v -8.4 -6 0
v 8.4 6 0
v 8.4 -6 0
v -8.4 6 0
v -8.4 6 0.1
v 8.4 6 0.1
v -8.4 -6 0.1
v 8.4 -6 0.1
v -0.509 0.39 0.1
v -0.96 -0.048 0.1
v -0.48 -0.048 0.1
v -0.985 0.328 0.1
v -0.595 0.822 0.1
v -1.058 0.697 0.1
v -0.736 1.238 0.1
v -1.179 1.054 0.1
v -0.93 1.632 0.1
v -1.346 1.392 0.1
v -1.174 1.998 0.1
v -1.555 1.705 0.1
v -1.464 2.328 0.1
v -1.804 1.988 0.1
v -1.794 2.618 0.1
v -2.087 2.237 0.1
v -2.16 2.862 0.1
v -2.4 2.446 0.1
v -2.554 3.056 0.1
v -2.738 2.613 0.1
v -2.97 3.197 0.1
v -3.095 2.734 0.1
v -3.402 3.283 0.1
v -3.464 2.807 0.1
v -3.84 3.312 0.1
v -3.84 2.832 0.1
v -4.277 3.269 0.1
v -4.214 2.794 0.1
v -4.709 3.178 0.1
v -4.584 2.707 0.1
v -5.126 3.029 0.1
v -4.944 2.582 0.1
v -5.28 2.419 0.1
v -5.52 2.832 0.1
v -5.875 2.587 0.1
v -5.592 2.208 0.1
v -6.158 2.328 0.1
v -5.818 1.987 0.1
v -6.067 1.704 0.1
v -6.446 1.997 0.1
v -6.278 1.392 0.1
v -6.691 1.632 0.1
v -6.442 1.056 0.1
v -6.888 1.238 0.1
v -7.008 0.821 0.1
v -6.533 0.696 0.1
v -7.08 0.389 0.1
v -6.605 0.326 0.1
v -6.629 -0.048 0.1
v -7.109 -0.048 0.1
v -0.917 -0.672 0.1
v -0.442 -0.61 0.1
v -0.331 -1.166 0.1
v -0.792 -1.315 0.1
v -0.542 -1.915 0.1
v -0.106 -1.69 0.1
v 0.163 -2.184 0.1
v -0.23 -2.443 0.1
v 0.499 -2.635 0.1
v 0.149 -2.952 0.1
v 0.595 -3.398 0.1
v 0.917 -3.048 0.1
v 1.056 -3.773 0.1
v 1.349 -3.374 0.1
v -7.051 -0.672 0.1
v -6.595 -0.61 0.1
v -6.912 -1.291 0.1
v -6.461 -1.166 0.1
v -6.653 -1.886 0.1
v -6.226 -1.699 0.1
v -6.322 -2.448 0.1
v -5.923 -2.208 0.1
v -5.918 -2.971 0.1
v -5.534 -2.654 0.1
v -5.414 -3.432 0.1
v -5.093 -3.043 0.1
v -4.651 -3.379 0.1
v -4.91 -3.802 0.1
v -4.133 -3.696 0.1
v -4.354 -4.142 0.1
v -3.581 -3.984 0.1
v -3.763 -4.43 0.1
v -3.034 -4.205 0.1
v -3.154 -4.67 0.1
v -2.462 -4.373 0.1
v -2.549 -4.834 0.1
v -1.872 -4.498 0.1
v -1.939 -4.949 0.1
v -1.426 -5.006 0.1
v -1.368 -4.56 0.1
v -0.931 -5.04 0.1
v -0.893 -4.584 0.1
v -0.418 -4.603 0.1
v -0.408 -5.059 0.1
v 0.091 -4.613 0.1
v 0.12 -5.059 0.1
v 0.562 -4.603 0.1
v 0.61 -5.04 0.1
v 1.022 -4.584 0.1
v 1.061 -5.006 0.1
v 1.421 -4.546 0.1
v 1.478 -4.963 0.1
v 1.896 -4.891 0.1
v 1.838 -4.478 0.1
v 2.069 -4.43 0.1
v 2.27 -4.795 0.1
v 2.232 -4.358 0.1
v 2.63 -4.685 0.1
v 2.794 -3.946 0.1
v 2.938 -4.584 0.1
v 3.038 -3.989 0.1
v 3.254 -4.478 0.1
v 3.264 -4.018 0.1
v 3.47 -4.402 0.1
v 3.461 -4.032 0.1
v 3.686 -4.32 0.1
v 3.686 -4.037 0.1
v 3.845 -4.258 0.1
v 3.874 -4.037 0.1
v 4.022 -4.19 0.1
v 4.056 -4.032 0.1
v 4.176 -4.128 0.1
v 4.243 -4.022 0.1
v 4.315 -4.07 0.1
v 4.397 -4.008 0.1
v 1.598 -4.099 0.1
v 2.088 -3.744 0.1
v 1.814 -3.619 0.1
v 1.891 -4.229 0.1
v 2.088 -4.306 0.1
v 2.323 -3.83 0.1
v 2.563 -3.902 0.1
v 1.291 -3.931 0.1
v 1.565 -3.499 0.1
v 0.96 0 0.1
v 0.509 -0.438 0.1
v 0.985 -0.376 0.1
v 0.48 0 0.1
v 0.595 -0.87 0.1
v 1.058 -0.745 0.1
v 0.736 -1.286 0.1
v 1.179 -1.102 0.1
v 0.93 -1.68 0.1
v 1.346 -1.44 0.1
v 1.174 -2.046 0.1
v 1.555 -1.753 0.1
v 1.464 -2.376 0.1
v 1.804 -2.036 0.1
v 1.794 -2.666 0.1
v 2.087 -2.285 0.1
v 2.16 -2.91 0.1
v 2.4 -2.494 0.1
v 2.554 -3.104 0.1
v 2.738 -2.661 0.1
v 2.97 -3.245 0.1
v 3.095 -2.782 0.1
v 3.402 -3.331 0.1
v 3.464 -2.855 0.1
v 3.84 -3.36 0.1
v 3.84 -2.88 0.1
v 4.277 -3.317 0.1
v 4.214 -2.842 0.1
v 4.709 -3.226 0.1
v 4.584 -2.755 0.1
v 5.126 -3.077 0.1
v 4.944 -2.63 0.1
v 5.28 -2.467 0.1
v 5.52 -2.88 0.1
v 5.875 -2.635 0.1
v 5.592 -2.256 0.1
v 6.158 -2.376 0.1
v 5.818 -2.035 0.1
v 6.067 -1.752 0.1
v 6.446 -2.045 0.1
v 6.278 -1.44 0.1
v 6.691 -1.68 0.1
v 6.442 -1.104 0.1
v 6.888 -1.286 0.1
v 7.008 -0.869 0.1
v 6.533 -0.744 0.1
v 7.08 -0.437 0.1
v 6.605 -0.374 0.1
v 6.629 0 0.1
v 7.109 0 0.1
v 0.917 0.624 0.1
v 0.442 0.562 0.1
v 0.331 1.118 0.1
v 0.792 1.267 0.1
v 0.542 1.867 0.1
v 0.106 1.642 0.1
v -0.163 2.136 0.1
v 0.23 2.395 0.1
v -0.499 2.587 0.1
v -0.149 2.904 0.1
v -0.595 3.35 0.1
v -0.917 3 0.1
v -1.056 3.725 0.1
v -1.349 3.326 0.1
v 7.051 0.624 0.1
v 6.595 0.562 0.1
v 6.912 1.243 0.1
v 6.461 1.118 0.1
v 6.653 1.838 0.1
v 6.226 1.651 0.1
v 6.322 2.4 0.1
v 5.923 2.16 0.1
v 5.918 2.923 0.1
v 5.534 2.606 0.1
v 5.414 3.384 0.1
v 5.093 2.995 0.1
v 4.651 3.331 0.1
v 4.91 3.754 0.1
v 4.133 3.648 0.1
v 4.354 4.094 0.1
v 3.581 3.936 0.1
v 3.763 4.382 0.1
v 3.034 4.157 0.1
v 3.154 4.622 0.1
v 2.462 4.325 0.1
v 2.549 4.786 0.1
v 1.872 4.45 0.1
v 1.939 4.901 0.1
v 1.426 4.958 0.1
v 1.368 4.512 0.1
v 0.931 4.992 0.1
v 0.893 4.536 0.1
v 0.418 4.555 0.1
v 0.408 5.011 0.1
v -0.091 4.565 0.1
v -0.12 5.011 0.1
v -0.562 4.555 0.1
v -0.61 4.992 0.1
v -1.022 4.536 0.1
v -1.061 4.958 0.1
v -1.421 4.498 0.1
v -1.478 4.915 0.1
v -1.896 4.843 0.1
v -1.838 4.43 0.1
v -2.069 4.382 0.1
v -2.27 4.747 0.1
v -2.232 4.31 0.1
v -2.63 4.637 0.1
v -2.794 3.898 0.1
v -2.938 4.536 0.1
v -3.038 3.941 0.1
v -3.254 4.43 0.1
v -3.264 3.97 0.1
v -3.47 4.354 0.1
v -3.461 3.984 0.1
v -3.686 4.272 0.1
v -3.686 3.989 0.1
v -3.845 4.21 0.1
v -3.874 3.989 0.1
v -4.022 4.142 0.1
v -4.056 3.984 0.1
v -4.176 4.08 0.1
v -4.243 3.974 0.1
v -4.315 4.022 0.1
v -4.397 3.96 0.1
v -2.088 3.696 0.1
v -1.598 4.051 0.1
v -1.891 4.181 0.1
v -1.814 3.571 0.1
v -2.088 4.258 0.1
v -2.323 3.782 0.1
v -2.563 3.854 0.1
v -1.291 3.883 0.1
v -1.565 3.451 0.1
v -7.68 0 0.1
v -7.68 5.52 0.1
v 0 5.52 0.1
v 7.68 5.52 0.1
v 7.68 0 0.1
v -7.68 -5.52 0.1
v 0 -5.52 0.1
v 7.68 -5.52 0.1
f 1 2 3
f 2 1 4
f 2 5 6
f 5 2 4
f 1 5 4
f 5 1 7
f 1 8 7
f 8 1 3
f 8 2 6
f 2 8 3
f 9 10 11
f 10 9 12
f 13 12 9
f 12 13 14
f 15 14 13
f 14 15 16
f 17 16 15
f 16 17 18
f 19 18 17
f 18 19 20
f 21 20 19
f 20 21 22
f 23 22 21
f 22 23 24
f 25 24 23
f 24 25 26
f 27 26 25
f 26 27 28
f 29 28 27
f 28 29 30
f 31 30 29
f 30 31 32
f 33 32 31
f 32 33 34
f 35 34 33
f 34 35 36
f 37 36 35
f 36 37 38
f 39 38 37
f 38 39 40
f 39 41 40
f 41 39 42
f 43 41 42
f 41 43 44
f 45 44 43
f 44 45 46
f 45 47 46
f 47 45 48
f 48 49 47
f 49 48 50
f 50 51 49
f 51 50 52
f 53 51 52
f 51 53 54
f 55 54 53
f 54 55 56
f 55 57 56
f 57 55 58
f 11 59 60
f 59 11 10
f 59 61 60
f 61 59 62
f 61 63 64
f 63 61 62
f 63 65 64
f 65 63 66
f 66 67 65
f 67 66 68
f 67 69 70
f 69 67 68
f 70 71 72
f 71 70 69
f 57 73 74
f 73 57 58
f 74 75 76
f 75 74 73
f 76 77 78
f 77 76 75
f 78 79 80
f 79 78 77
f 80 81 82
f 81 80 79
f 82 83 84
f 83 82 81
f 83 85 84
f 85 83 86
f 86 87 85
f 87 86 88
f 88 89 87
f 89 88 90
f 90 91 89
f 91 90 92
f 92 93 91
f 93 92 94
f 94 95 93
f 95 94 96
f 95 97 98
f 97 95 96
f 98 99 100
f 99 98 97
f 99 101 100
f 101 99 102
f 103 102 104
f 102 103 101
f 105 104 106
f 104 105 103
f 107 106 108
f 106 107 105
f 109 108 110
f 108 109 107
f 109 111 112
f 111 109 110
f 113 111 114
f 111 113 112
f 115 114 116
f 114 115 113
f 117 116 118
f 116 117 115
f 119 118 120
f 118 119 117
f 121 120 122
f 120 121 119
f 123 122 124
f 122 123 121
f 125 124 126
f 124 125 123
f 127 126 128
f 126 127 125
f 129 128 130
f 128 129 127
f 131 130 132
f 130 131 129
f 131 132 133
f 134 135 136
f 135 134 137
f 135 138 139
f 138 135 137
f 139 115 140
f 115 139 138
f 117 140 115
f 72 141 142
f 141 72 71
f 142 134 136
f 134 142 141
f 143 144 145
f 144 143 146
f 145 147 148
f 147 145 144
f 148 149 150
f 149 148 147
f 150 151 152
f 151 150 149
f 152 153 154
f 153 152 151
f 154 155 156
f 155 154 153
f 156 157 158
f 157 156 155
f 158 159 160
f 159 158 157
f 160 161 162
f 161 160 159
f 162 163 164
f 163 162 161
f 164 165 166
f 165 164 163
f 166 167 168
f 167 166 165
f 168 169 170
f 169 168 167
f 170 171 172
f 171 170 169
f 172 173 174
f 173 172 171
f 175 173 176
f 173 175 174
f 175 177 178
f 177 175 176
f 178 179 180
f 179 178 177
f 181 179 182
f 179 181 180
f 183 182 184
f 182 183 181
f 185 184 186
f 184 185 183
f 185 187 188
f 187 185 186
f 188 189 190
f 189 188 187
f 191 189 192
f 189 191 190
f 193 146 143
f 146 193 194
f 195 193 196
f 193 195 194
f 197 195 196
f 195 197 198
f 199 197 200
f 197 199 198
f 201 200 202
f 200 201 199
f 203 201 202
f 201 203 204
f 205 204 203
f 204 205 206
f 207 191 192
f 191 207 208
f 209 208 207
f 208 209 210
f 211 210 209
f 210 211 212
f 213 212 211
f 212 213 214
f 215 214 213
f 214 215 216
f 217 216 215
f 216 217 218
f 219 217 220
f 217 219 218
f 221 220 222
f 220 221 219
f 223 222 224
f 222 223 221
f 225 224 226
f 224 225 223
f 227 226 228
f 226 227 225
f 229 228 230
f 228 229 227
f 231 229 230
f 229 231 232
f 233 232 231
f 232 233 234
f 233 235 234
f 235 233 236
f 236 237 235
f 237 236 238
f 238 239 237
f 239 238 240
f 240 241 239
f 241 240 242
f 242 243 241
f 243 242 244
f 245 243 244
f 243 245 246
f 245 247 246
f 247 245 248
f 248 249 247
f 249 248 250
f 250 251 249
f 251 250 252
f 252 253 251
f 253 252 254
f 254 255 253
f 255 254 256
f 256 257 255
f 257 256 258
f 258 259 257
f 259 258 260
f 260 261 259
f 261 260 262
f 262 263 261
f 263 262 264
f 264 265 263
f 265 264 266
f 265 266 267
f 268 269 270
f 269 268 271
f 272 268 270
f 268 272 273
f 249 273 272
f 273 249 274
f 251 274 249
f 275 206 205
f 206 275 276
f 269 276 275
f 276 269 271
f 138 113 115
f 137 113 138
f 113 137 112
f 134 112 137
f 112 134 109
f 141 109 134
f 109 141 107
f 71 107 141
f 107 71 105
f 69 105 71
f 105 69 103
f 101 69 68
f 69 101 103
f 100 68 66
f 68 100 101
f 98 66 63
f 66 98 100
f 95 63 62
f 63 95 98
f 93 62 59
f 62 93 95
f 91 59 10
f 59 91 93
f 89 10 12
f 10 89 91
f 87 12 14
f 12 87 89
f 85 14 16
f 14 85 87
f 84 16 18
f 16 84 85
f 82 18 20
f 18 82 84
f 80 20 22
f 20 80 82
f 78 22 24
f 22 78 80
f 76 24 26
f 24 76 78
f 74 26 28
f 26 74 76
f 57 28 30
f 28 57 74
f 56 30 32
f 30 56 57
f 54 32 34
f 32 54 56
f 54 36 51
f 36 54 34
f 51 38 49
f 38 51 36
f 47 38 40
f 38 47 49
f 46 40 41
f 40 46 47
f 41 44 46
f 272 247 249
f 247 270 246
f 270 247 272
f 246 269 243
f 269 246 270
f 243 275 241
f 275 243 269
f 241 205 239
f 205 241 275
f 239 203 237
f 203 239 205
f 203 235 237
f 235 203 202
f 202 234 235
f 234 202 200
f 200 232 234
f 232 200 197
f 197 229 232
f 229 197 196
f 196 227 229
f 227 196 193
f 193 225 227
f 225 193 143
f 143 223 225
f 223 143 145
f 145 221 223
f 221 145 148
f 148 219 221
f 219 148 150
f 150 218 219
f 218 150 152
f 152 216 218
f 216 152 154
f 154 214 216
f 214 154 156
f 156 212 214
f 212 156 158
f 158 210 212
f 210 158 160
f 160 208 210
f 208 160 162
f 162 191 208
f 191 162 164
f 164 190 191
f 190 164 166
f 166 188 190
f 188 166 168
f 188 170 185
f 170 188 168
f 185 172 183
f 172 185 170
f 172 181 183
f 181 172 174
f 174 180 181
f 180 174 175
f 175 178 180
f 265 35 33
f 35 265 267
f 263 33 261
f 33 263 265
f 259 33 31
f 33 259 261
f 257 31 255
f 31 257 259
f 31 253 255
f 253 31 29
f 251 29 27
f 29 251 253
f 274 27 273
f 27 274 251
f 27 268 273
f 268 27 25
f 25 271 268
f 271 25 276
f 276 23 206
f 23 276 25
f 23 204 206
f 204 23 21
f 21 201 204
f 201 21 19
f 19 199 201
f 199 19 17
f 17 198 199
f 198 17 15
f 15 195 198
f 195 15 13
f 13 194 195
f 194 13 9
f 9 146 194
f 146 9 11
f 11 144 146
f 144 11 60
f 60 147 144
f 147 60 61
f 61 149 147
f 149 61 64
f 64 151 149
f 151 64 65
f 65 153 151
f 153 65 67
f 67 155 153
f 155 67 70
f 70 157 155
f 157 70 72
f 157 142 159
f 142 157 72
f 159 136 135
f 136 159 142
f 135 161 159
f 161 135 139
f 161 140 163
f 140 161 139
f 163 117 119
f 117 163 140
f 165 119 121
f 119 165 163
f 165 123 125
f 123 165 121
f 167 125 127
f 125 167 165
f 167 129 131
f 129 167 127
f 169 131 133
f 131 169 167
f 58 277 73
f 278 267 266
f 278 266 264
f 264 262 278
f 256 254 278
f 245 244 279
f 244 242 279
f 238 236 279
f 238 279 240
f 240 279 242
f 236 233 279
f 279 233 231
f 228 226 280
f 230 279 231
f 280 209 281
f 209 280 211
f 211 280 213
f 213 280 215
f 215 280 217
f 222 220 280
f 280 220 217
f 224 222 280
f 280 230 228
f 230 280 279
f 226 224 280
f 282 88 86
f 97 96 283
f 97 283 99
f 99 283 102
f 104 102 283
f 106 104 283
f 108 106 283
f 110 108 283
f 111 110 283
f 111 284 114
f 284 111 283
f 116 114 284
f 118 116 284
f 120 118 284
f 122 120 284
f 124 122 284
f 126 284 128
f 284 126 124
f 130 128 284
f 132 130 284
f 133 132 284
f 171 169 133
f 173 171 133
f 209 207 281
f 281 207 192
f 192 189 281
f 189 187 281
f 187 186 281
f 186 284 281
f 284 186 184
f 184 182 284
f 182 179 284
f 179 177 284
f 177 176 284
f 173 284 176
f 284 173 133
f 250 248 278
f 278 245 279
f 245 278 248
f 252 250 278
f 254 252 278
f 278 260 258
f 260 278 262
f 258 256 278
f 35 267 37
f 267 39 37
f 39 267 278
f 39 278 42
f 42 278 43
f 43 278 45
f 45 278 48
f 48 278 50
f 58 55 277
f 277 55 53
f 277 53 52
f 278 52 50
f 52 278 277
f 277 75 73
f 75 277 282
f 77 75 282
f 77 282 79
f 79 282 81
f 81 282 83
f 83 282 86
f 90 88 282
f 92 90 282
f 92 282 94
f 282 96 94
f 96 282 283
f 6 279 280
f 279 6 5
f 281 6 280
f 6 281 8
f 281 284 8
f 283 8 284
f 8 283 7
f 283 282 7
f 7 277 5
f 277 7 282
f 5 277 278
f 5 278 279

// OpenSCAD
// file: ../p/48/1-4ring6.scad
use <../../lib.scad>
function ldraw_lib__48__1_4ring6() = [
// 0 Hi-Res Ring  6 x 0.25
// 0 Name: 48\1-4ring6.dat
// 0 Author: Steve Bliss [sbliss]
// 0 !LDRAW_ORG 48_Primitive UPDATE 2012-02
// 0 !LICENSE Licensed under CC BY 4.0 : see CAreadme.txt
// 
// 0 BFC CERTIFY CCW
  [0,"BFC","CERTIFY"],
  [0,"BFC","CCW"],
// 
// 0 !HISTORY 2002-01-06 [sbliss] Added BFC compliance.
// 0 !HISTORY 2003-03-12 [PTadmin] Official Update 2003-01
// 0 !HISTORY 2007-06-24 [PTadmin] Header formatted for Contributor Agreement
// 0 !HISTORY 2008-07-01 [PTadmin] Official Update 2008-01
// 0 !HISTORY 2012-02-27 [Philo] Changed to CCW
// 0 !HISTORY 2012-08-09 [PTadmin] Official Update 2012-02
// 
// 
// 4 16 7 0 0 6.9398 0 0.9135 5.9484 0 0.783 6 0 0
  [4,16,7,0,0,6.9398,0,0.9135,5.9484,0,0.783,6,0,0],
// 4 16 6.9398 0 0.9135 6.7613 0 1.8116 5.7954 0 1.5528 5.9484 0 0.783
  [4,16,6.9398,0,0.9135,6.7613,0,1.8116,5.7954,0,1.5528,5.9484,0,0.783],
// 4 16 6.7613 0 1.8116 6.4673 0 2.6789 5.5434 0 2.2962 5.7954 0 1.5528
  [4,16,6.7613,0,1.8116,6.4673,0,2.6789,5.5434,0,2.2962,5.7954,0,1.5528],
// 4 16 6.4673 0 2.6789 6.062 0 3.5 5.196 0 3 5.5434 0 2.2962
  [4,16,6.4673,0,2.6789,6.062,0,3.5,5.196,0,3,5.5434,0,2.2962],
// 4 16 6.062 0 3.5 5.5538 0 4.2616 4.7604 0 3.6528 5.196 0 3
  [4,16,6.062,0,3.5,5.5538,0,4.2616,4.7604,0,3.6528,5.196,0,3],
// 4 16 5.5538 0 4.2616 4.9497 0 4.9497 4.2426 0 4.2426 4.7604 0 3.6528
  [4,16,5.5538,0,4.2616,4.9497,0,4.9497,4.2426,0,4.2426,4.7604,0,3.6528],
// 4 16 4.9497 0 4.9497 4.2616 0 5.5538 3.6528 0 4.7604 4.2426 0 4.2426
  [4,16,4.9497,0,4.9497,4.2616,0,5.5538,3.6528,0,4.7604,4.2426,0,4.2426],
// 4 16 4.2616 0 5.5538 3.5 0 6.062 3 0 5.196 3.6528 0 4.7604
  [4,16,4.2616,0,5.5538,3.5,0,6.062,3,0,5.196,3.6528,0,4.7604],
// 4 16 3.5 0 6.062 2.6789 0 6.4673 2.2962 0 5.5434 3 0 5.196
  [4,16,3.5,0,6.062,2.6789,0,6.4673,2.2962,0,5.5434,3,0,5.196],
// 4 16 2.6789 0 6.4673 1.8116 0 6.7613 1.5528 0 5.7954 2.2962 0 5.5434
  [4,16,2.6789,0,6.4673,1.8116,0,6.7613,1.5528,0,5.7954,2.2962,0,5.5434],
// 4 16 1.8116 0 6.7613 0.9135 0 6.9398 0.783 0 5.9484 1.5528 0 5.7954
  [4,16,1.8116,0,6.7613,0.9135,0,6.9398,0.783,0,5.9484,1.5528,0,5.7954],
// 4 16 0.9135 0 6.9398 0 0 7 0 0 6 0.783 0 5.9484
  [4,16,0.9135,0,6.9398,0,0,7,0,0,6,0.783,0,5.9484],
];
module ldraw_lib__48__1_4ring6(step=0, col=false, unit=2/5, alt=false, line=0.2, solid=!$preview)
    makepoly(ldraw_lib__48__1_4ring6(), step=step, col=col, unit=unit, alt=alt, line=line, solid=solid);
ldraw_lib__48__1_4ring6(line=0.2);
// file: ../p/logo-octan-2.scad
use <../lib.scad>
function ldraw_lib__logo_octan_2() = [
// 0 Logo Octan - Single Drop
// 0 Name: logo-octan-2.dat
// 0 Author: Ulrich Röder [UR]
// 0 !LDRAW_ORG Primitive UPDATE 2022-01
// 0 !LICENSE Licensed under CC BY 4.0 : see CAreadme.txt
// 
// 0 BFC CERTIFY CCW
  [0,"BFC","CERTIFY"],
  [0,"BFC","CCW"],
// 
// 0 !HISTORY 2022-01-14 [PTadmin] Official Update 2022-01
// 
// 
// 3 16 12.35 0 -8.87 12.31 0 -9.13 12.65 0 -8.98
  [3,16,12.35,0,-8.87,12.31,0,-9.13,12.65,0,-8.98],
// 4 16 12.35 0 -8.87 11.94 0 -8.71 11.83 0 -9.23 12.31 0 -9.13
  [4,16,12.35,0,-8.87,11.94,0,-8.71,11.83,0,-9.23,12.31,0,-9.13],
// 4 16 11.83 0 -9.23 11.94 0 -8.71 11.33 0 -8.44 10.96 0 -9.37
  [4,16,11.83,0,-9.23,11.94,0,-8.71,11.33,0,-8.44,10.96,0,-9.37],
// 4 16 10.96 0 -9.37 11.33 0 -8.44 10.69 0 -8.09 10.13 0 -9.45
  [4,16,10.96,0,-9.37,11.33,0,-8.44,10.69,0,-8.09,10.13,0,-9.45],
// 4 16 10.13 0 -9.45 10.69 0 -8.09 10.2 0 -7.76 9.17 0 -9.49
  [4,16,10.13,0,-9.45,10.69,0,-8.09,10.2,0,-7.76,9.17,0,-9.49],
// 4 16 9.17 0 -9.49 10.2 0 -7.76 9.24 0 -6.98 8.19 0 -9.51
  [4,16,9.17,0,-9.49,10.2,0,-7.76,9.24,0,-6.98,8.19,0,-9.51],
// 4 16 8.19 0 -9.51 9.24 0 -6.98 8.31 0 -6.05 7.13 0 -9.49
  [4,16,8.19,0,-9.51,9.24,0,-6.98,8.31,0,-6.05,7.13,0,-9.49],
// 4 16 7.13 0 -9.49 8.31 0 -6.05 7.52 0 -4.99 6.14 0 -9.45
  [4,16,7.13,0,-9.49,8.31,0,-6.05,7.52,0,-4.99,6.14,0,-9.45],
// 4 16 6.14 0 -9.45 7.52 0 -4.99 6.87 0 -3.89 5.15 0 -9.4
  [4,16,6.14,0,-9.45,7.52,0,-4.99,6.87,0,-3.89,5.15,0,-9.4],
// 4 16 5.15 0 -9.4 6.87 0 -3.89 6.35 0 -2.64 4.1 0 -9.27
  [4,16,5.15,0,-9.4,6.87,0,-3.89,6.35,0,-2.64,4.1,0,-9.27],
// 4 16 4.1 0 -9.27 6.35 0 -2.64 6.09 0 -1.3 2.87 0 -9.01
  [4,16,4.1,0,-9.27,6.35,0,-2.64,6.09,0,-1.3,2.87,0,-9.01],
// 4 16 2.87 0 -9.01 6.09 0 -1.3 6 0 0 1.68 0 -8.66
  [4,16,2.87,0,-9.01,6.09,0,-1.3,6,0,0,1.68,0,-8.66],
// 4 16 1.68 0 -8.66 6 0 0 5.9484 0 .783 .54 0 -8.2
  [4,16,1.68,0,-8.66,6,0,0,5.9484,0,.783,.54,0,-8.2],
// 4 16 .54 0 -8.2 5.9484 0 .783 5.7954 0 1.5528 -.61 0 -7.6
  [4,16,.54,0,-8.2,5.9484,0,.783,5.7954,0,1.5528,-.61,0,-7.6],
// 4 16 -.61 0 -7.6 5.7954 0 1.5528 5.5434 0 2.2962 -1.69 0 -6.94
  [4,16,-.61,0,-7.6,5.7954,0,1.5528,5.5434,0,2.2962,-1.69,0,-6.94],
// 4 16 -1.69 0 -6.94 5.5434 0 2.2962 5.196 0 3 -2.61 0 -6.24
  [4,16,-1.69,0,-6.94,5.5434,0,2.2962,5.196,0,3,-2.61,0,-6.24],
// 4 16 -2.61 0 -6.24 5.196 0 3 4.7604 0 3.6528 -3.53 0 -5.43
  [4,16,-2.61,0,-6.24,5.196,0,3,4.7604,0,3.6528,-3.53,0,-5.43],
// 4 16 -3.53 0 -5.43 4.7604 0 3.6528 4.2426 0 4.2426 -4.34 0 -4.5
  [4,16,-3.53,0,-5.43,4.7604,0,3.6528,4.2426,0,4.2426,-4.34,0,-4.5],
// 4 16 -4.34 0 -4.5 4.2426 0 4.2426 3.6528 0 4.7604 -4.97 0 -3.44
  [4,16,-4.34,0,-4.5,4.2426,0,4.2426,3.6528,0,4.7604,-4.97,0,-3.44],
// 4 16 -4.97 0 -3.44 3.6528 0 4.7604 3 0 5.196 -5.46 0 -2.33
  [4,16,-4.97,0,-3.44,3.6528,0,4.7604,3,0,5.196,-5.46,0,-2.33],
// 4 16 -5.46 0 -2.33 3 0 5.196 2.2962 0 5.5434 -5.74 0 -1.17
  [4,16,-5.46,0,-2.33,3,0,5.196,2.2962,0,5.5434,-5.74,0,-1.17],
// 4 16 -5.74 0 -1.17 2.2962 0 5.5434 1.5528 0 5.7954 -5.81 0 0
  [4,16,-5.74,0,-1.17,2.2962,0,5.5434,1.5528,0,5.7954,-5.81,0,0],
// 4 16 -5.81 0 0 1.5528 0 5.7954 .783 0 5.9484 -5.76 0 .78
  [4,16,-5.81,0,0,1.5528,0,5.7954,.783,0,5.9484,-5.76,0,.78],
// 4 16 -5.76 0 .78 .783 0 5.9484 0 0 6 -5.61 0 1.55
  [4,16,-5.76,0,.78,.783,0,5.9484,0,0,6,-5.61,0,1.55],
// 4 16 -5.61 0 1.55 0 0 6 -.78 0 5.92 -5.42 0 2.3
  [4,16,-5.61,0,1.55,0,0,6,-.78,0,5.92,-5.42,0,2.3],
// 4 16 -5.42 0 2.3 -.78 0 5.92 -1.55 0 5.74 -5.08 0 3
  [4,16,-5.42,0,2.3,-.78,0,5.92,-1.55,0,5.74,-5.08,0,3],
// 4 16 -5.08 0 3 -1.55 0 5.74 -2.3 0 5.48 -4.64 0 3.65
  [4,16,-5.08,0,3,-1.55,0,5.74,-2.3,0,5.48,-4.64,0,3.65],
// 4 16 -2.3 0 5.48 -3 0 5.14 -4.12 0 4.24 -4.64 0 3.65
  [4,16,-2.3,0,5.48,-3,0,5.14,-4.12,0,4.24,-4.64,0,3.65],
// 3 16 -3 0 5.14 -3.65 0 4.7 -4.12 0 4.24
  [3,16,-3,0,5.14,-3.65,0,4.7,-4.12,0,4.24],
];
module ldraw_lib__logo_octan_2(step=0, col=false, unit=2/5, alt=false, line=0.2, solid=!$preview)
    makepoly(ldraw_lib__logo_octan_2(), step=step, col=col, unit=unit, alt=alt, line=line, solid=solid);
ldraw_lib__logo_octan_2(line=0.2);
// file: ../p/logo-octan-1.scad
use <../lib.scad>
use <48/1-4ring6.scad>
function ldraw_lib__logo_octan_1() = [
// 0 Logo Octan - Single Drop Frame
// 0 Name: logo-octan-1.dat
// 0 Author: Ulrich Röder [UR]
// 0 !LDRAW_ORG Primitive UPDATE 2022-01
// 0 !LICENSE Licensed under CC BY 4.0 : see CAreadme.txt
// 
// 0 BFC CERTIFY CCW
  [0,"BFC","CERTIFY"],
  [0,"BFC","CCW"],
// 
// 0 !HISTORY 2022-01-14 [PTadmin] Official Update 2022-01
// 
// 
// 1 16 0 0 0 1 0 0 0 1 0 0 0 1 48\1-4ring6.dat
  [1,16,0,0,0,1,0,0,0,1,0,0,0,1, ldraw_lib__48__1_4ring6()],
// 4 16 -.78 0 5.92 0 0 6 0 0 7 -.91 0 6.91
  [4,16,-.78,0,5.92,0,0,6,0,0,7,-.91,0,6.91],
// 4 16 -1.55 0 5.74 -.78 0 5.92 -.91 0 6.91 -1.81 0 6.72
  [4,16,-1.55,0,5.74,-.78,0,5.92,-.91,0,6.91,-1.81,0,6.72],
// 4 16 -2.3 0 5.48 -1.55 0 5.74 -1.81 0 6.72 -2.68 0 6.41
  [4,16,-2.3,0,5.48,-1.55,0,5.74,-1.81,0,6.72,-2.68,0,6.41],
// 4 16 -3 0 5.14 -2.3 0 5.48 -2.68 0 6.41 -3.5 0 6
  [4,16,-3,0,5.14,-2.3,0,5.48,-2.68,0,6.41,-3.5,0,6],
// 4 16 -3.65 0 4.7 -3 0 5.14 -3.5 0 6 -4.24 0 5.49
  [4,16,-3.65,0,4.7,-3,0,5.14,-3.5,0,6,-4.24,0,5.49],
// 4 16 -4.12 0 4.24 -3.65 0 4.7 -4.24 0 5.49 -4.83 0 4.95
  [4,16,-4.12,0,4.24,-3.65,0,4.7,-4.24,0,5.49,-4.83,0,4.95],
// 4 16 -4.64 0 3.65 -4.12 0 4.24 -4.83 0 4.95 -5.43 0 4.26
  [4,16,-4.64,0,3.65,-4.12,0,4.24,-4.83,0,4.95,-5.43,0,4.26],
// 4 16 -5.08 0 3 -4.64 0 3.65 -5.43 0 4.26 -5.94 0 3.5
  [4,16,-5.08,0,3,-4.64,0,3.65,-5.43,0,4.26,-5.94,0,3.5],
// 4 16 -5.42 0 2.3 -5.08 0 3 -5.94 0 3.5 -6.35 0 2.68
  [4,16,-5.42,0,2.3,-5.08,0,3,-5.94,0,3.5,-6.35,0,2.68],
// 4 16 -5.61 0 1.55 -5.42 0 2.3 -6.35 0 2.68 -6.6 0 1.81
  [4,16,-5.61,0,1.55,-5.42,0,2.3,-6.35,0,2.68,-6.6,0,1.81],
// 4 16 -5.76 0 .78 -5.61 0 1.55 -6.6 0 1.81 -6.75 0 .91
  [4,16,-5.76,0,.78,-5.61,0,1.55,-6.6,0,1.81,-6.75,0,.91],
// 4 16 -5.81 0 0 -5.76 0 .78 -6.75 0 .91 -6.81 0 0
  [4,16,-5.81,0,0,-5.76,0,.78,-6.75,0,.91,-6.81,0,0],
// 4 16 6.09 0 -1.3 7.08 0 -1.17 7 0 0 6 0 0
  [4,16,6.09,0,-1.3,7.08,0,-1.17,7,0,0,6,0,0],
// 4 16 6.35 0 -2.64 7.31 0 -2.33 7.08 0 -1.17 6.09 0 -1.3
  [4,16,6.35,0,-2.64,7.31,0,-2.33,7.08,0,-1.17,6.09,0,-1.3],
// 4 16 6.87 0 -3.89 7.78 0 -3.42 7.31 0 -2.33 6.35 0 -2.64
  [4,16,6.87,0,-3.89,7.78,0,-3.42,7.31,0,-2.33,6.35,0,-2.64],
// 4 16 7.52 0 -4.99 8.34 0 -4.45 7.78 0 -3.42 6.87 0 -3.89
  [4,16,7.52,0,-4.99,8.34,0,-4.45,7.78,0,-3.42,6.87,0,-3.89],
// 4 16 8.31 0 -6.05 9.04 0 -5.39 8.34 0 -4.45 7.52 0 -4.99
  [4,16,8.31,0,-6.05,9.04,0,-5.39,8.34,0,-4.45,7.52,0,-4.99],
// 4 16 9.24 0 -6.98 9.91 0 -6.25 9.04 0 -5.39 8.31 0 -6.05
  [4,16,9.24,0,-6.98,9.91,0,-6.25,9.04,0,-5.39,8.31,0,-6.05],
// 4 16 10.2 0 -7.76 10.81 0 -6.93 9.91 0 -6.25 9.24 0 -6.98
  [4,16,10.2,0,-7.76,10.81,0,-6.93,9.91,0,-6.25,9.24,0,-6.98],
// 4 16 -5.74 0 -1.17 -5.81 0 0 -6.81 0 0 -6.69 0 -1.3
  [4,16,-5.74,0,-1.17,-5.81,0,0,-6.81,0,0,-6.69,0,-1.3],
// 4 16 -5.46 0 -2.33 -5.74 0 -1.17 -6.69 0 -1.3 -6.4 0 -2.59
  [4,16,-5.46,0,-2.33,-5.74,0,-1.17,-6.69,0,-1.3,-6.4,0,-2.59],
// 4 16 -4.97 0 -3.44 -5.46 0 -2.33 -6.4 0 -2.59 -5.86 0 -3.83
  [4,16,-4.97,0,-3.44,-5.46,0,-2.33,-6.4,0,-2.59,-5.86,0,-3.83],
// 4 16 -4.34 0 -4.5 -4.97 0 -3.44 -5.86 0 -3.83 -5.17 0 -5
  [4,16,-4.34,0,-4.5,-4.97,0,-3.44,-5.86,0,-3.83,-5.17,0,-5],
// 4 16 -3.53 0 -5.43 -4.34 0 -4.5 -5.17 0 -5 -4.33 0 -6.09
  [4,16,-3.53,0,-5.43,-4.34,0,-4.5,-5.17,0,-5,-4.33,0,-6.09],
// 4 16 -2.61 0 -6.24 -3.53 0 -5.43 -4.33 0 -6.09 -3.28 0 -7.05
  [4,16,-2.61,0,-6.24,-3.53,0,-5.43,-4.33,0,-6.09,-3.28,0,-7.05],
// 4 16 -1.69 0 -6.94 -2.61 0 -6.24 -3.28 0 -7.05 -2.23 0 -7.82
  [4,16,-1.69,0,-6.94,-2.61,0,-6.24,-3.28,0,-7.05,-2.23,0,-7.82],
// 4 16 -.61 0 -7.6 -1.69 0 -6.94 -2.23 0 -7.82 -1.07 0 -8.53
  [4,16,-.61,0,-7.6,-1.69,0,-6.94,-2.23,0,-7.82,-1.07,0,-8.53],
// 4 16 .54 0 -8.2 -.61 0 -7.6 -1.07 0 -8.53 .16 0 -9.13
  [4,16,.54,0,-8.2,-.61,0,-7.6,-1.07,0,-8.53,.16,0,-9.13],
// 4 16 1.68 0 -8.66 .54 0 -8.2 .16 0 -9.13 1.43 0 -9.63
  [4,16,1.68,0,-8.66,.54,0,-8.2,.16,0,-9.13,1.43,0,-9.63],
// 4 16 2.87 0 -9.01 1.68 0 -8.66 1.43 0 -9.63 2.69 0 -9.97
  [4,16,2.87,0,-9.01,1.68,0,-8.66,1.43,0,-9.63,2.69,0,-9.97],
// 4 16 4.1 0 -9.27 2.87 0 -9.01 2.69 0 -9.97 3.96 0 -10.21
  [4,16,4.1,0,-9.27,2.87,0,-9.01,2.69,0,-9.97,3.96,0,-10.21],
// 4 16 4.1 0 -9.27 3.96 0 -10.21 5.03 0 -10.33 5.15 0 -9.4
  [4,16,4.1,0,-9.27,3.96,0,-10.21,5.03,0,-10.33,5.15,0,-9.4],
// 4 16 6.14 0 -9.45 5.15 0 -9.4 5.03 0 -10.33 6.06 0 -10.4
  [4,16,6.14,0,-9.45,5.15,0,-9.4,5.03,0,-10.33,6.06,0,-10.4],
// 4 16 7.13 0 -9.49 6.14 0 -9.45 6.06 0 -10.4 7.15 0 -10.44
  [4,16,7.13,0,-9.49,6.14,0,-9.45,6.06,0,-10.4,7.15,0,-10.44],
// 4 16 7.13 0 -9.49 7.15 0 -10.44 8.25 0 -10.44 8.19 0 -9.51
  [4,16,7.13,0,-9.49,7.15,0,-10.44,8.25,0,-10.44,8.19,0,-9.51],
// 4 16 8.19 0 -9.51 8.25 0 -10.44 9.27 0 -10.4 9.17 0 -9.49
  [4,16,8.19,0,-9.51,8.25,0,-10.44,9.27,0,-10.4,9.17,0,-9.49],
// 4 16 9.17 0 -9.49 9.27 0 -10.4 10.21 0 -10.33 10.13 0 -9.45
  [4,16,9.17,0,-9.49,9.27,0,-10.4,10.21,0,-10.33,10.13,0,-9.45],
// 4 16 10.13 0 -9.45 10.21 0 -10.33 11.08 0 -10.24 10.96 0 -9.37
  [4,16,10.13,0,-9.45,10.21,0,-10.33,11.08,0,-10.24,10.96,0,-9.37],
// 4 16 10.96 0 -9.37 11.08 0 -10.24 11.95 0 -10.09 11.83 0 -9.23
  [4,16,10.96,0,-9.37,11.08,0,-10.24,11.95,0,-10.09,11.83,0,-9.23],
// 4 16 11.83 0 -9.23 11.95 0 -10.09 12.73 0 -9.89 12.31 0 -9.13
  [4,16,11.83,0,-9.23,11.95,0,-10.09,12.73,0,-9.89,12.31,0,-9.13],
// 4 16 12.31 0 -9.13 12.73 0 -9.89 13.48 0 -9.66 12.65 0 -8.98
  [4,16,12.31,0,-9.13,12.73,0,-9.89,13.48,0,-9.66,12.65,0,-8.98],
// 4 16 12.65 0 -8.98 13.48 0 -9.66 14.12 0 -9.45 13.82 0 -8.12
  [4,16,12.65,0,-8.98,13.48,0,-9.66,14.12,0,-9.45,13.82,0,-8.12],
// 4 16 13.82 0 -8.12 14.12 0 -9.45 14.78 0 -9.23 14.33 0 -8.21
  [4,16,13.82,0,-8.12,14.12,0,-9.45,14.78,0,-9.23,14.33,0,-8.21],
// 4 16 14.33 0 -8.21 14.78 0 -9.23 15.23 0 -9.07 14.8 0 -8.27
  [4,16,14.33,0,-8.21,14.78,0,-9.23,15.23,0,-9.07,14.8,0,-8.27],
// 4 16 14.8 0 -8.27 15.23 0 -9.07 15.68 0 -8.9 15.21 0 -8.3
  [4,16,14.8,0,-8.27,15.23,0,-9.07,15.68,0,-8.9,15.21,0,-8.3],
// 4 16 15.21 0 -8.3 15.68 0 -8.9 16.01 0 -8.77 15.68 0 -8.31
  [4,16,15.21,0,-8.3,15.68,0,-8.9,16.01,0,-8.77,15.68,0,-8.31],
// 4 16 15.68 0 -8.31 16.01 0 -8.77 16.38 0 -8.63 16.07 0 -8.31
  [4,16,15.68,0,-8.31,16.01,0,-8.77,16.38,0,-8.63,16.07,0,-8.31],
// 4 16 16.07 0 -8.31 16.38 0 -8.63 16.7 0 -8.5 16.45 0 -8.3
  [4,16,16.07,0,-8.31,16.38,0,-8.63,16.7,0,-8.5,16.45,0,-8.3],
// 4 16 16.45 0 -8.3 16.7 0 -8.5 16.99 0 -8.38 16.84 0 -8.28
  [4,16,16.45,0,-8.3,16.7,0,-8.5,16.99,0,-8.38,16.84,0,-8.28],
// 3 16 16.84 0 -8.28 16.99 0 -8.38 17.16 0 -8.25
  [3,16,16.84,0,-8.28,16.99,0,-8.38,17.16,0,-8.25],
// 4 16 11.78 0 -7.44 11.33 0 -8.44 11.94 0 -8.71 12.35 0 -7.7
  [4,16,11.78,0,-7.44,11.33,0,-8.44,11.94,0,-8.71,12.35,0,-7.7],
// 4 16 11.94 0 -8.71 12.35 0 -8.87 12.84 0 -7.88 12.35 0 -7.7
  [4,16,11.94,0,-8.71,12.35,0,-8.87,12.84,0,-7.88,12.35,0,-7.7],
// 4 16 12.84 0 -7.88 12.35 0 -8.87 12.65 0 -8.98 13.34 0 -8.03
  [4,16,12.84,0,-7.88,12.35,0,-8.87,12.65,0,-8.98,13.34,0,-8.03],
// 3 16 13.82 0 -8.12 13.34 0 -8.03 12.65 0 -8.98
  [3,16,13.82,0,-8.12,13.34,0,-8.03,12.65,0,-8.98],
// 4 16 10.81 0 -6.93 10.2 0 -7.76 10.69 0 -8.09 11.26 0 -7.19
  [4,16,10.81,0,-6.93,10.2,0,-7.76,10.69,0,-8.09,11.26,0,-7.19],
// 4 16 11.33 0 -8.44 11.78 0 -7.44 11.26 0 -7.19 10.69 0 -8.09
  [4,16,11.33,0,-8.44,11.78,0,-7.44,11.26,0,-7.19,10.69,0,-8.09],
];
module ldraw_lib__logo_octan_1(step=0, col=false, unit=2/5, alt=false, line=0.2, solid=!$preview)
    makepoly(ldraw_lib__logo_octan_1(), step=step, col=col, unit=unit, alt=alt, line=line, solid=solid);
ldraw_lib__logo_octan_1(line=0.2);
// file: ../p/box5-12.scad
use <../lib.scad>
function ldraw_lib__box5_12() = [
// 0 Box with 5 Faces without Any Edges
// 0 Name: box5-12.dat
// 0 Author: Chris Dee [cwdee]
// 0 !LDRAW_ORG Primitive UPDATE 2009-02
// 0 !LICENSE Licensed under CC BY 4.0 : see CAreadme.txt
// 
// 0 BFC CERTIFY CCW
  [0,"BFC","CERTIFY"],
  [0,"BFC","CCW"],
// 
// 0 !HISTORY 2009-09-03 [PTadmin] Official Update 2009-02
// 
// 
// 4 16 1 1 1 1 1 -1 -1 1 -1 -1 1 1
  [4,16,1,1,1,1,1,-1,-1,1,-1,-1,1,1],
// 4 16 -1 0 1 1 0 1 1 1 1 -1 1 1
  [4,16,-1,0,1,1,0,1,1,1,1,-1,1,1],
// 4 16 -1 0 -1 -1 0 1 -1 1 1 -1 1 -1
  [4,16,-1,0,-1,-1,0,1,-1,1,1,-1,1,-1],
// 4 16 1 0 -1 -1 0 -1 -1 1 -1 1 1 -1
  [4,16,1,0,-1,-1,0,-1,-1,1,-1,1,1,-1],
// 4 16 1 0 1 1 0 -1 1 1 -1 1 1 1
  [4,16,1,0,1,1,0,-1,1,1,-1,1,1,1],
// 0
];
module ldraw_lib__box5_12(step=0, col=false, unit=2/5, alt=false, line=0.2, solid=!$preview)
    makepoly(ldraw_lib__box5_12(), step=step, col=col, unit=unit, alt=alt, line=line, solid=solid);
ldraw_lib__box5_12(line=0.2);
// main file
use <../lib.scad>
use <../p/box5-12.scad>
use <../p/logo-octan.scad>
function ldraw_lib__165355c() = [
// 0 Sticker  1.5 x  2.1 with Octan Logo on Transparent Background
// 0 Name: 165355c.dat
// 0 Author: Takeshi Takahashi [RainbowDolphin]
// 0 !LDRAW_ORG Part UPDATE 2023-04
// 0 !LICENSE Licensed under CC BY 4.0 : see CAreadme.txt
// 
// 0 BFC CERTIFY CCW
  [0,"BFC","CERTIFY"],
  [0,"BFC","CCW"],
// 
// 0 !KEYWORDS  Bricklink 6594stk01,  Brickowl 253587,  Rebrickable 165355,  tanker
// 0 !KEYWORDS  trailer,  truck, Set 6594
// 
// 0 !HISTORY 2023-08-25 [OrionP] Official Update 2023-04
// 
// 
// 1 16 0 -0.25 0 21 0 0 0 0.25 0 0 0 15 box5-12.dat
  [1,16,0,-0.25,0,21,0,0,0,0.25,0,0,0,15, ldraw_lib__box5_12()],
// 0 BFC NOCLIP
  [0,"BFC","NOCLIP"],
// 1 16 0 -0.25 0 1.2 0 0 0 1 0 0 0 1.2 logo-octan.dat
  [1,16,0,-0.25,0,1.2,0,0,0,1,0,0,0,1.2, ldraw_lib__logo_octan()],
// 0 BFC CLIP
  [0,"BFC","CLIP"],
// 4 16 21 -0.25 15 -21 -0.25 15 0 -0.25 13.8 19.2 -0.25 13.8
  [4,16,21,-0.25,15,-21,-0.25,15,0,-0.25,13.8,19.2,-0.25,13.8],
// 4 16 21 -0.25 15 19.2 -0.25 13.8 19.2 -0.25 0 21 -0.25 -15
  [4,16,21,-0.25,15,19.2,-0.25,13.8,19.2,-0.25,0,21,-0.25,-15],
// 3 16 19.2 -0.25 0 19.2 -0.25 -13.8 21 -0.25 -15
  [3,16,19.2,-0.25,0,19.2,-0.25,-13.8,21,-0.25,-15],
// 4 16 21 -0.25 -15 19.2 -0.25 -13.8 0 -0.25 -13.8 -21 -0.25 -15
  [4,16,21,-0.25,-15,19.2,-0.25,-13.8,0,-0.25,-13.8,-21,-0.25,-15],
// 3 16 0 -0.25 -13.8 -19.2 -0.25 -13.8 -21 -0.25 -15
  [3,16,0,-0.25,-13.8,-19.2,-0.25,-13.8,-21,-0.25,-15],
// 4 16 -21 -0.25 -15 -19.2 -0.25 -13.8 -19.2 -0.25 0 -21 -0.25 15
  [4,16,-21,-0.25,-15,-19.2,-0.25,-13.8,-19.2,-0.25,0,-21,-0.25,15],
// 3 16 -21 -0.25 15 -19.2 -0.25 0 -19.2 -0.25 13.8
  [3,16,-21,-0.25,15,-19.2,-0.25,0,-19.2,-0.25,13.8],
// 3 16 -21 -0.25 15 -19.2 -0.25 13.8 0 -0.25 13.8
  [3,16,-21,-0.25,15,-19.2,-0.25,13.8,0,-0.25,13.8],
];
module ldraw_lib__165355c(step=0, col=false, unit=2/5, alt=false, line=0.2, solid=!$preview)
    makepoly(ldraw_lib__165355c(), step=step, col=col, unit=unit, alt=alt, line=line, solid=solid);
ldraw_lib__165355c(line=0.2);
